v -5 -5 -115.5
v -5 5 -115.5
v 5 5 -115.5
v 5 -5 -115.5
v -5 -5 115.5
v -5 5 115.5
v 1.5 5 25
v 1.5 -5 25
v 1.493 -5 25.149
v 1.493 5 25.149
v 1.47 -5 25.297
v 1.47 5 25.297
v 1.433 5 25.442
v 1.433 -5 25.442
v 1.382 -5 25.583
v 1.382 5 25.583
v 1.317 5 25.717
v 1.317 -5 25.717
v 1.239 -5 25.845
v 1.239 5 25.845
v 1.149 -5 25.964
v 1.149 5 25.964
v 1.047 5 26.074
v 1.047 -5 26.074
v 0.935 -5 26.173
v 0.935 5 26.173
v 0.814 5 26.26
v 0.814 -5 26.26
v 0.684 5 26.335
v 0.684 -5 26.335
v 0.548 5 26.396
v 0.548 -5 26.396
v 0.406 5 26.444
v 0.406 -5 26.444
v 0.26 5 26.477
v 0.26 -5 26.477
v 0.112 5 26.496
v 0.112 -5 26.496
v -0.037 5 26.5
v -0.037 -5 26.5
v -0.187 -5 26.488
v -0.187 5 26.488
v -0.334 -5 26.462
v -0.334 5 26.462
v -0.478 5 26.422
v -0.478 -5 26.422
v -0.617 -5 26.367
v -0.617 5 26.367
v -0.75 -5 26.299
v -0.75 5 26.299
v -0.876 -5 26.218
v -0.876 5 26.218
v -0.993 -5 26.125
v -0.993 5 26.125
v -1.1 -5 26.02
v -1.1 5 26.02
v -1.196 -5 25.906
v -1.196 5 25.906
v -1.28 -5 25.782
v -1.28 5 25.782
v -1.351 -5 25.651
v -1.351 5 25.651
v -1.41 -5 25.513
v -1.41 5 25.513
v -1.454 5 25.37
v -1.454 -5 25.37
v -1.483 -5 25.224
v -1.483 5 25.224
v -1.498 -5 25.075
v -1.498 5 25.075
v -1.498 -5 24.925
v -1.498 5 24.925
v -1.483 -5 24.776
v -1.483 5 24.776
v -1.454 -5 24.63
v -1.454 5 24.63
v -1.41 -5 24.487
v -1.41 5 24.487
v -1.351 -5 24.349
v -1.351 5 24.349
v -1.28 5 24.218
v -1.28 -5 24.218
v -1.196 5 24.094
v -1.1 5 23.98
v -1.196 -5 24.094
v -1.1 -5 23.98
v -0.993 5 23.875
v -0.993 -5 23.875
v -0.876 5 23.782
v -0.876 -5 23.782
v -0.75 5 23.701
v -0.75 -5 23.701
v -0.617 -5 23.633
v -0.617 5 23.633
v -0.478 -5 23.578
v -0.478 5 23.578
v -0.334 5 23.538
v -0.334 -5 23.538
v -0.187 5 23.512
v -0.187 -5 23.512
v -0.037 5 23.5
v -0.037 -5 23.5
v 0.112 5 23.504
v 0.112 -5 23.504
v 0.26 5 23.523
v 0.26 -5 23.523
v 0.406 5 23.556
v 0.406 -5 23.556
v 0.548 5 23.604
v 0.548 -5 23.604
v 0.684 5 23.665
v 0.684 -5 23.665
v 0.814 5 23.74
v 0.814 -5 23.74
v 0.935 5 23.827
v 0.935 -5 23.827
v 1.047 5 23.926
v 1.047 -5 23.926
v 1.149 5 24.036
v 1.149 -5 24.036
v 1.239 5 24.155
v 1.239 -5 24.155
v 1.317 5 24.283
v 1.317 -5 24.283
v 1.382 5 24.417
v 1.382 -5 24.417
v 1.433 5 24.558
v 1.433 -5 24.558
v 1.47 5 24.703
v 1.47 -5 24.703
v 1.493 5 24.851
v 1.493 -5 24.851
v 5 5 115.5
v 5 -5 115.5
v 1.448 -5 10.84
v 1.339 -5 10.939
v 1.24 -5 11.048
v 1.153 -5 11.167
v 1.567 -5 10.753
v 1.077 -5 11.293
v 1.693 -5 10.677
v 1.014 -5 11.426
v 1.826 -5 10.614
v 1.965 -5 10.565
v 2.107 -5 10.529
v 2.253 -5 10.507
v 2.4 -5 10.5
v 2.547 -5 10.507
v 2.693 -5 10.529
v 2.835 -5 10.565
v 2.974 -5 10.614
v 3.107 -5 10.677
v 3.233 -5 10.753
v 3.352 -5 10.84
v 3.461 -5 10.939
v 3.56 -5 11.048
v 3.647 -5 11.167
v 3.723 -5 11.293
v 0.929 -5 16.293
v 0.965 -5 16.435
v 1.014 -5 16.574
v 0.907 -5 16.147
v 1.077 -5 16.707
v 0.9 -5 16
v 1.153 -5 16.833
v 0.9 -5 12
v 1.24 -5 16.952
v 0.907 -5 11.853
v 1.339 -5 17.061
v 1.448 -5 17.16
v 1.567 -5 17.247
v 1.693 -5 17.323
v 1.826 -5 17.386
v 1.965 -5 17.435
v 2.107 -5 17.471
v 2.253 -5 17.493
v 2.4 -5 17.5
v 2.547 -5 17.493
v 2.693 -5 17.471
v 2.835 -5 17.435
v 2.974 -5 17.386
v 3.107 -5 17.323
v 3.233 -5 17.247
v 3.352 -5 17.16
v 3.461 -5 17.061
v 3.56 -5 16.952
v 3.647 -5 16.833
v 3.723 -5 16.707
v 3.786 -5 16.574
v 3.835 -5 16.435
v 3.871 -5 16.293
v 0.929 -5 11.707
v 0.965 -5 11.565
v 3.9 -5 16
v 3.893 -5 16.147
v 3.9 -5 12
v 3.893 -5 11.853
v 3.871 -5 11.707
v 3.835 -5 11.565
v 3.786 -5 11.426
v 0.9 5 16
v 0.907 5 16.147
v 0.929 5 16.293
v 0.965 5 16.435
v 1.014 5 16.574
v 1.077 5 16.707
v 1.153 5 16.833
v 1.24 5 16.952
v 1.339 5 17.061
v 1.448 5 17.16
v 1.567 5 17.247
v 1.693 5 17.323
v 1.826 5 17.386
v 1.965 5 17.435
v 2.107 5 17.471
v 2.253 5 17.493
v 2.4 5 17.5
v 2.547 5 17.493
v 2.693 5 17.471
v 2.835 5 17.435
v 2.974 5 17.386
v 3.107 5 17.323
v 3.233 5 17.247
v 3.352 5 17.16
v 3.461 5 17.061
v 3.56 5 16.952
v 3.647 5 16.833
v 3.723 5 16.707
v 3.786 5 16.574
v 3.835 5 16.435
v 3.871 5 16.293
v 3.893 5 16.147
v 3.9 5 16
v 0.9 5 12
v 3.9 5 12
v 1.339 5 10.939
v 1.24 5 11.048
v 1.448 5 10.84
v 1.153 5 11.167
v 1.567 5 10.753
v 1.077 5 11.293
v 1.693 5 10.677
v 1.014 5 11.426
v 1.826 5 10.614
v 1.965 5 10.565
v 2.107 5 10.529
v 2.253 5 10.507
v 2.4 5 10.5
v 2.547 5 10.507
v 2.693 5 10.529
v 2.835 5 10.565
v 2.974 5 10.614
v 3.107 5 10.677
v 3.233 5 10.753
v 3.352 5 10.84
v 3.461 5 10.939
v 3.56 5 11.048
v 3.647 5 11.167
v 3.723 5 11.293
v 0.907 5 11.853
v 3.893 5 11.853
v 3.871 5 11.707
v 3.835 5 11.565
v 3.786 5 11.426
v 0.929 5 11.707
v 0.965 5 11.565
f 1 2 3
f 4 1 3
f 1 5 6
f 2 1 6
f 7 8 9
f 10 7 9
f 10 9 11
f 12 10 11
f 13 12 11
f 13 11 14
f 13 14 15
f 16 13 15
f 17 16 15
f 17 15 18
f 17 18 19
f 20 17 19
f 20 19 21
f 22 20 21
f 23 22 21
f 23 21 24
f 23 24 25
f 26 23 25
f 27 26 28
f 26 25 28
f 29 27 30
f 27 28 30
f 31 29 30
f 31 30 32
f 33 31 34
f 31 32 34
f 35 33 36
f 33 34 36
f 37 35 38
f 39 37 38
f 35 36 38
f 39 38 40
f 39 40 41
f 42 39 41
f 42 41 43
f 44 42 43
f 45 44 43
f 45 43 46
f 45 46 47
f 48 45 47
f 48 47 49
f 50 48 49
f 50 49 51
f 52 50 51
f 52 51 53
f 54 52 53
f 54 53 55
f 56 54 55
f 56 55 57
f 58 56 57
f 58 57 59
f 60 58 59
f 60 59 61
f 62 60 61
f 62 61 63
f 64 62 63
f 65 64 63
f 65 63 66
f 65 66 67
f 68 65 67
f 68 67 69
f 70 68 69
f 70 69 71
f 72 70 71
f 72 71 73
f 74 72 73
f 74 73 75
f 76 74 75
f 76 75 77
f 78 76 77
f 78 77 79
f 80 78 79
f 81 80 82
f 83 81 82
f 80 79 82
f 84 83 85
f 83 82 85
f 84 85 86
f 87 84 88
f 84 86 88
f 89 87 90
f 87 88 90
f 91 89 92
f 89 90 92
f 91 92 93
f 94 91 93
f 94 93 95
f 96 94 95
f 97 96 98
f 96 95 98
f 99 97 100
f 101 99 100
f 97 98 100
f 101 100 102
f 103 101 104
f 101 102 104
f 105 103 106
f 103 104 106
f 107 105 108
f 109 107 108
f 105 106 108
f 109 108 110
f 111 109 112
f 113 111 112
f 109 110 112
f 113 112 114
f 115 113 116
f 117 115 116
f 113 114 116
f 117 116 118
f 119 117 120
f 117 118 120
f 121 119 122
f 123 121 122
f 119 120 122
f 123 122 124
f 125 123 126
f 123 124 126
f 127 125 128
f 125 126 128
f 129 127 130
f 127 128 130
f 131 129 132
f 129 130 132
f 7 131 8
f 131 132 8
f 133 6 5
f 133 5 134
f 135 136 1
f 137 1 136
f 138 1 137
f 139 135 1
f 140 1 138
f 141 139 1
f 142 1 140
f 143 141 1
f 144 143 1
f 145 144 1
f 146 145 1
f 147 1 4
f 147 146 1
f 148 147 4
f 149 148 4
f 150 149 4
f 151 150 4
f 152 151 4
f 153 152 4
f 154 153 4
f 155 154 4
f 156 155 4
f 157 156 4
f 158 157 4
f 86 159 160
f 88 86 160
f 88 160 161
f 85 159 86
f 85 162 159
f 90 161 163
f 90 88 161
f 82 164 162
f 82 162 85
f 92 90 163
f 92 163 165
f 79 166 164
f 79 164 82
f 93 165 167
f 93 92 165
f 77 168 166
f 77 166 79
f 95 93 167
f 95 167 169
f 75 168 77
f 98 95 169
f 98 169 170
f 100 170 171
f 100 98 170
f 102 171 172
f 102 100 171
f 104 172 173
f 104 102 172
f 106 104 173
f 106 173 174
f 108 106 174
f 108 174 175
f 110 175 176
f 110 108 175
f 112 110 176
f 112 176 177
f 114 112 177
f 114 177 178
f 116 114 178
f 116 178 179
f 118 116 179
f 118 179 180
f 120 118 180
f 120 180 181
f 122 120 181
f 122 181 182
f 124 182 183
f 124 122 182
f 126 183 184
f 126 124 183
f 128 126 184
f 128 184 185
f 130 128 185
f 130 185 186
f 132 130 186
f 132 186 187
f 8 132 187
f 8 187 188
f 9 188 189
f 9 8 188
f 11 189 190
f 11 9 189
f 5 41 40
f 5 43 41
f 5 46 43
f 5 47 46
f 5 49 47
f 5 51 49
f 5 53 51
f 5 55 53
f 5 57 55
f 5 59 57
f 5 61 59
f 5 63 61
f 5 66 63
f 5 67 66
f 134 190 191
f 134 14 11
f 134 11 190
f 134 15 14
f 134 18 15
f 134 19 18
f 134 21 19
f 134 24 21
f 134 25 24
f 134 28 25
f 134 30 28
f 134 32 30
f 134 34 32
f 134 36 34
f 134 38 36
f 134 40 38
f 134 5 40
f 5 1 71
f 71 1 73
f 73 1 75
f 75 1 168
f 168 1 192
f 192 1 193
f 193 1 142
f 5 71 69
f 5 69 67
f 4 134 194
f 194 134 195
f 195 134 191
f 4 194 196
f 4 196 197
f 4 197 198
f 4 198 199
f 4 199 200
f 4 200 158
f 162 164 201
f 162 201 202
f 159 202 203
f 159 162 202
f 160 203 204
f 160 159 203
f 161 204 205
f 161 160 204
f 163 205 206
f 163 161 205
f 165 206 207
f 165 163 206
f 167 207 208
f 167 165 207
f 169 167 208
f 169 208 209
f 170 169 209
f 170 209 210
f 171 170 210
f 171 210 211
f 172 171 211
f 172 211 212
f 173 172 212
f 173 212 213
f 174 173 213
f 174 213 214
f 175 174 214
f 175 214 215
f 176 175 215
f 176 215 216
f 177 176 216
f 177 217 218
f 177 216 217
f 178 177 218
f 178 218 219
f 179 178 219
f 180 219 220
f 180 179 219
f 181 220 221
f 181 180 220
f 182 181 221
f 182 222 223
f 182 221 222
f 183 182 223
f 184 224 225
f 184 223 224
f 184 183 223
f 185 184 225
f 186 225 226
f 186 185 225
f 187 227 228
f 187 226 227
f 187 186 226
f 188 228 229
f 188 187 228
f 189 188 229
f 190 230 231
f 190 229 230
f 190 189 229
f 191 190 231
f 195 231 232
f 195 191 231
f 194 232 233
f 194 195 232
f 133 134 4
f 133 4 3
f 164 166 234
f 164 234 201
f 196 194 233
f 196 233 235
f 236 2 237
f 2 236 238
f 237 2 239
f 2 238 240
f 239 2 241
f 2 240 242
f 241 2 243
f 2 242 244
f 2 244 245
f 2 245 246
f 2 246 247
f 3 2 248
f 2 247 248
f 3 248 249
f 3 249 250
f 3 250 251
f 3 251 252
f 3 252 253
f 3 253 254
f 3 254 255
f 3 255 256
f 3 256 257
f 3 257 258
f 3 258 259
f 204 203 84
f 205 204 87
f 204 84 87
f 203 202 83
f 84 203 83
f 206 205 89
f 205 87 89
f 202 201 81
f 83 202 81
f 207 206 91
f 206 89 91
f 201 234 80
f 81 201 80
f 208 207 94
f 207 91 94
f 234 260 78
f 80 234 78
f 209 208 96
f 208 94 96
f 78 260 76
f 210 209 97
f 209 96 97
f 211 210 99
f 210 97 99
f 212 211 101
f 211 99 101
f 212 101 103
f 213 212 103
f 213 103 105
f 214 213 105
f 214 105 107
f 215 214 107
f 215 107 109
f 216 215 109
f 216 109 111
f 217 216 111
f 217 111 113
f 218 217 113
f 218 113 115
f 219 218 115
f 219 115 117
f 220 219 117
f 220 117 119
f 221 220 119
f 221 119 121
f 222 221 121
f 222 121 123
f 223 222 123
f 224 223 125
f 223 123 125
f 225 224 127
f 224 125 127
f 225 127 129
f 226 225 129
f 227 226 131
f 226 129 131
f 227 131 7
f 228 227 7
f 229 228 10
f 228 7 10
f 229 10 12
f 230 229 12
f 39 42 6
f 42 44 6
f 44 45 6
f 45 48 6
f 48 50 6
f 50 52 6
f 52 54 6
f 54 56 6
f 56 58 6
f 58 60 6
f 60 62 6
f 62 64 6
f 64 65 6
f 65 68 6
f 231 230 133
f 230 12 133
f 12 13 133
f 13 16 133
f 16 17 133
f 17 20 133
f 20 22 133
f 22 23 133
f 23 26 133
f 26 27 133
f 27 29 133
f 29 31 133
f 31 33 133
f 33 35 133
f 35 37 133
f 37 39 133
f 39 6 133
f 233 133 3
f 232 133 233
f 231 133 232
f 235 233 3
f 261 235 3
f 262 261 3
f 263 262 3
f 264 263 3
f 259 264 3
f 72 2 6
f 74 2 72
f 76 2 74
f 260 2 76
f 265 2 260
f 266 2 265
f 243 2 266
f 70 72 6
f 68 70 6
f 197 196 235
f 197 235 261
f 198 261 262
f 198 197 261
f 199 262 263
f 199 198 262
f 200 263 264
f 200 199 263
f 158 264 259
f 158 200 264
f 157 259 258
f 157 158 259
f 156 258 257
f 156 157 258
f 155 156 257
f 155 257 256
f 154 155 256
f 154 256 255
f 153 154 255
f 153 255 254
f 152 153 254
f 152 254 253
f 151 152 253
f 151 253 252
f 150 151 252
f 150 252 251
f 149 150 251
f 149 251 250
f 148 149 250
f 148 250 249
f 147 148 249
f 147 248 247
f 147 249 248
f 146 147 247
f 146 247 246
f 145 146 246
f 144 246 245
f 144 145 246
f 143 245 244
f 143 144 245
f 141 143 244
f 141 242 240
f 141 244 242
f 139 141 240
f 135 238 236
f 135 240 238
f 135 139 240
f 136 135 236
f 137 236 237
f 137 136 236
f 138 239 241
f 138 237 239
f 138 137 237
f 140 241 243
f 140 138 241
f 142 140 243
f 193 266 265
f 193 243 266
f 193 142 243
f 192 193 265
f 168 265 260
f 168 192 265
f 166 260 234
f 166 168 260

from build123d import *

# Parameters (mm, degrees)
ESQUISSE1_W             = 10
ESQUISSE1_H             = 10
BOSS_EXTRU_1_DEPTH      = 115.5
BOSS_EXTRU_1_DEPTH_BACK = 115.5
ESQUISSE2_R             = 1.5
ENL_V_MAT_EXTRU_1_DEPTH = 11
ENL_V_MAT_EXTRU_2_DEPTH = 11


with BuildPart() as part:
    # Esquisse1 → Boss.-Extru.1 (new body, two sides)
    with BuildSketch(Plane.XY) as boss_extru_1_sk:
        Rectangle(ESQUISSE1_W, ESQUISSE1_H)
    extrude(amount=BOSS_EXTRU_1_DEPTH)
    extrude(boss_extru_1_sk.sketch, amount=-BOSS_EXTRU_1_DEPTH_BACK)

    # Esquisse2 → Enlèv. mat.-Extru.1 (cut, through all)
    with BuildSketch(Plane.XZ.offset(5)):
        with Locations((0, 25)):
            Circle(ESQUISSE2_R)
    extrude(amount=-ENL_V_MAT_EXTRU_1_DEPTH, mode=Mode.SUBTRACT)

    # Esquisse3 → Enlèv. mat.-Extru.2 (cut, through all)
    with BuildSketch(Plane.XZ.offset(5)):
        with BuildLine():
            Line((0.9, 12), (0.9, 16))
            ThreePointArc((0.9, 16), (2.4, 17.5), (3.9, 16))
            Line((3.9, 16), (3.9, 12))
            ThreePointArc((3.9, 12), (2.4, 10.5), (0.9, 12))
        make_face()
    extrude(amount=-ENL_V_MAT_EXTRU_2_DEPTH, mode=Mode.SUBTRACT)


solid = part.part
